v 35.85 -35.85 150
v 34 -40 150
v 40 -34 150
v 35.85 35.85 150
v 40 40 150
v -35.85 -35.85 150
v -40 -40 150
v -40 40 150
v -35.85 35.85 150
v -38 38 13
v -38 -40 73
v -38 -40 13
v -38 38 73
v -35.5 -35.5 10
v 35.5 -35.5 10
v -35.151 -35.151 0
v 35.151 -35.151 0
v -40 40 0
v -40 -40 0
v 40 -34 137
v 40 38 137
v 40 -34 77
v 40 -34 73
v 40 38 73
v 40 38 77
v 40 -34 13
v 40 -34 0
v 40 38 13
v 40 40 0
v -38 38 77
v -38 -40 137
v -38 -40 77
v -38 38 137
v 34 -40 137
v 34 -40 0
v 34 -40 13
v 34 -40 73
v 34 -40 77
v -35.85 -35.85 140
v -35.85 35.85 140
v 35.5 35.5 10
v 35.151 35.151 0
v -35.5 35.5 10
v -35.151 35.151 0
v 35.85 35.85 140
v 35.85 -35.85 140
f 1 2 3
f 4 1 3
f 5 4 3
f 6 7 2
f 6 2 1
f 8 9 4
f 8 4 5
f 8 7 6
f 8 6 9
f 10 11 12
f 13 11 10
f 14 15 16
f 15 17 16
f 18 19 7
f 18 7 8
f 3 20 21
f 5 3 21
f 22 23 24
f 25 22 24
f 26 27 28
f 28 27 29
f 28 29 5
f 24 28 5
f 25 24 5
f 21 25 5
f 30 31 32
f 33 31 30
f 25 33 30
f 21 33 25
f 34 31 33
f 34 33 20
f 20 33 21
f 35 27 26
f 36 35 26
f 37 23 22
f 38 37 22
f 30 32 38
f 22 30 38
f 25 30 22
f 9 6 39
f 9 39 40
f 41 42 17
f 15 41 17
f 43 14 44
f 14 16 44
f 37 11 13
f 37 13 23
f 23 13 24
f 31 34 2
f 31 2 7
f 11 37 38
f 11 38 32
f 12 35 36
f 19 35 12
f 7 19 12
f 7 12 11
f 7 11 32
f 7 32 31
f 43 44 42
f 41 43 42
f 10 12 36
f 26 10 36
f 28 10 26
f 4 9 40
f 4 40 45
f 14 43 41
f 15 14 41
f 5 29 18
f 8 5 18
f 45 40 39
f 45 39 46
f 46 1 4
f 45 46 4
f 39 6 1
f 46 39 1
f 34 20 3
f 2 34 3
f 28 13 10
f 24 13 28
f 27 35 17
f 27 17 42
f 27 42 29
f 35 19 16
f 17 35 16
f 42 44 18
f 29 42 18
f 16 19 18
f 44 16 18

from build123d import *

# Parameters (mm, degrees)
SKETCH1_W                           = 80
SKETCH1_H                           = 80
BOSS_EXTRUDE1_DEPTH                 = 150
SKETCH2_W                           = 71.7
SKETCH2_H                           = 71.7
CUT_EXTRUDE1_71_7SQUARE_DEPTH       = 10
SKETCH4_W                           = 78
SKETCH4_H                           = 78
CUT_EXTRUDE2_COMPARTMENT1_6CM_DEPTH = 60
SKETCH5_W                           = 78
SKETCH5_H                           = 78
CUT_EXTRUDE3_DEPTH                  = 60
SKETCH6_W                           = 71
SKETCH6_H                           = 71
CUT_EXTRUDE4_DEPTH                  = 60
CUT_EXTRUDE4_TAPER                  = 2
CHAMFER1_SIZE                       = 6


with BuildPart() as part:
    # Sketch1 → Boss-Extrude1 (new body)
    with BuildSketch(Plane(origin=(0, 0, 0), x_dir=(0, 1, 0), z_dir=(0, 0, 1))):
        Rectangle(SKETCH1_W, SKETCH1_H)
    extrude(amount=BOSS_EXTRUDE1_DEPTH)

    # Sketch2 → Cut-Extrude1-71.7square (cut)
    with BuildSketch(Plane.XY.offset(150)):
        Rectangle(SKETCH2_W, SKETCH2_H)
    extrude(amount=-CUT_EXTRUDE1_71_7SQUARE_DEPTH, mode=Mode.SUBTRACT)

    # Sketch4 → Cut-Extrude2-compartment1-6cm (cut)
    with BuildSketch(Plane.XY.offset(137)):
        with Locations((1, -1)):
            Rectangle(SKETCH4_W, SKETCH4_H)
    extrude(amount=-CUT_EXTRUDE2_COMPARTMENT1_6CM_DEPTH, mode=Mode.SUBTRACT)

    # Sketch5 → Cut-Extrude3 (cut)
    with BuildSketch(Plane.XY.offset(73)):
        with Locations((1, -1)):
            Rectangle(SKETCH5_W, SKETCH5_H)
    extrude(amount=-CUT_EXTRUDE3_DEPTH, mode=Mode.SUBTRACT)

    # Sketch6 → Cut-Extrude4 (cut)
    with BuildSketch(Plane(origin=(0, 0, 10), x_dir=(1, 0, 0), z_dir=(0, 0, -1))):
        Rectangle(SKETCH6_W, SKETCH6_H)
    extrude(amount=CUT_EXTRUDE4_DEPTH, taper=CUT_EXTRUDE4_TAPER, mode=Mode.SUBTRACT)

    # Chamfer1
    chamfer1_edges = [part.edges().sort_by_distance(p)[0] for p in [
        (40, -40, 75),
        (40, -40, 6.5),
        (40, -40, 143.5),
    ]]
    chamfer(chamfer1_edges, length=CHAMFER1_SIZE)


solid = part.part
